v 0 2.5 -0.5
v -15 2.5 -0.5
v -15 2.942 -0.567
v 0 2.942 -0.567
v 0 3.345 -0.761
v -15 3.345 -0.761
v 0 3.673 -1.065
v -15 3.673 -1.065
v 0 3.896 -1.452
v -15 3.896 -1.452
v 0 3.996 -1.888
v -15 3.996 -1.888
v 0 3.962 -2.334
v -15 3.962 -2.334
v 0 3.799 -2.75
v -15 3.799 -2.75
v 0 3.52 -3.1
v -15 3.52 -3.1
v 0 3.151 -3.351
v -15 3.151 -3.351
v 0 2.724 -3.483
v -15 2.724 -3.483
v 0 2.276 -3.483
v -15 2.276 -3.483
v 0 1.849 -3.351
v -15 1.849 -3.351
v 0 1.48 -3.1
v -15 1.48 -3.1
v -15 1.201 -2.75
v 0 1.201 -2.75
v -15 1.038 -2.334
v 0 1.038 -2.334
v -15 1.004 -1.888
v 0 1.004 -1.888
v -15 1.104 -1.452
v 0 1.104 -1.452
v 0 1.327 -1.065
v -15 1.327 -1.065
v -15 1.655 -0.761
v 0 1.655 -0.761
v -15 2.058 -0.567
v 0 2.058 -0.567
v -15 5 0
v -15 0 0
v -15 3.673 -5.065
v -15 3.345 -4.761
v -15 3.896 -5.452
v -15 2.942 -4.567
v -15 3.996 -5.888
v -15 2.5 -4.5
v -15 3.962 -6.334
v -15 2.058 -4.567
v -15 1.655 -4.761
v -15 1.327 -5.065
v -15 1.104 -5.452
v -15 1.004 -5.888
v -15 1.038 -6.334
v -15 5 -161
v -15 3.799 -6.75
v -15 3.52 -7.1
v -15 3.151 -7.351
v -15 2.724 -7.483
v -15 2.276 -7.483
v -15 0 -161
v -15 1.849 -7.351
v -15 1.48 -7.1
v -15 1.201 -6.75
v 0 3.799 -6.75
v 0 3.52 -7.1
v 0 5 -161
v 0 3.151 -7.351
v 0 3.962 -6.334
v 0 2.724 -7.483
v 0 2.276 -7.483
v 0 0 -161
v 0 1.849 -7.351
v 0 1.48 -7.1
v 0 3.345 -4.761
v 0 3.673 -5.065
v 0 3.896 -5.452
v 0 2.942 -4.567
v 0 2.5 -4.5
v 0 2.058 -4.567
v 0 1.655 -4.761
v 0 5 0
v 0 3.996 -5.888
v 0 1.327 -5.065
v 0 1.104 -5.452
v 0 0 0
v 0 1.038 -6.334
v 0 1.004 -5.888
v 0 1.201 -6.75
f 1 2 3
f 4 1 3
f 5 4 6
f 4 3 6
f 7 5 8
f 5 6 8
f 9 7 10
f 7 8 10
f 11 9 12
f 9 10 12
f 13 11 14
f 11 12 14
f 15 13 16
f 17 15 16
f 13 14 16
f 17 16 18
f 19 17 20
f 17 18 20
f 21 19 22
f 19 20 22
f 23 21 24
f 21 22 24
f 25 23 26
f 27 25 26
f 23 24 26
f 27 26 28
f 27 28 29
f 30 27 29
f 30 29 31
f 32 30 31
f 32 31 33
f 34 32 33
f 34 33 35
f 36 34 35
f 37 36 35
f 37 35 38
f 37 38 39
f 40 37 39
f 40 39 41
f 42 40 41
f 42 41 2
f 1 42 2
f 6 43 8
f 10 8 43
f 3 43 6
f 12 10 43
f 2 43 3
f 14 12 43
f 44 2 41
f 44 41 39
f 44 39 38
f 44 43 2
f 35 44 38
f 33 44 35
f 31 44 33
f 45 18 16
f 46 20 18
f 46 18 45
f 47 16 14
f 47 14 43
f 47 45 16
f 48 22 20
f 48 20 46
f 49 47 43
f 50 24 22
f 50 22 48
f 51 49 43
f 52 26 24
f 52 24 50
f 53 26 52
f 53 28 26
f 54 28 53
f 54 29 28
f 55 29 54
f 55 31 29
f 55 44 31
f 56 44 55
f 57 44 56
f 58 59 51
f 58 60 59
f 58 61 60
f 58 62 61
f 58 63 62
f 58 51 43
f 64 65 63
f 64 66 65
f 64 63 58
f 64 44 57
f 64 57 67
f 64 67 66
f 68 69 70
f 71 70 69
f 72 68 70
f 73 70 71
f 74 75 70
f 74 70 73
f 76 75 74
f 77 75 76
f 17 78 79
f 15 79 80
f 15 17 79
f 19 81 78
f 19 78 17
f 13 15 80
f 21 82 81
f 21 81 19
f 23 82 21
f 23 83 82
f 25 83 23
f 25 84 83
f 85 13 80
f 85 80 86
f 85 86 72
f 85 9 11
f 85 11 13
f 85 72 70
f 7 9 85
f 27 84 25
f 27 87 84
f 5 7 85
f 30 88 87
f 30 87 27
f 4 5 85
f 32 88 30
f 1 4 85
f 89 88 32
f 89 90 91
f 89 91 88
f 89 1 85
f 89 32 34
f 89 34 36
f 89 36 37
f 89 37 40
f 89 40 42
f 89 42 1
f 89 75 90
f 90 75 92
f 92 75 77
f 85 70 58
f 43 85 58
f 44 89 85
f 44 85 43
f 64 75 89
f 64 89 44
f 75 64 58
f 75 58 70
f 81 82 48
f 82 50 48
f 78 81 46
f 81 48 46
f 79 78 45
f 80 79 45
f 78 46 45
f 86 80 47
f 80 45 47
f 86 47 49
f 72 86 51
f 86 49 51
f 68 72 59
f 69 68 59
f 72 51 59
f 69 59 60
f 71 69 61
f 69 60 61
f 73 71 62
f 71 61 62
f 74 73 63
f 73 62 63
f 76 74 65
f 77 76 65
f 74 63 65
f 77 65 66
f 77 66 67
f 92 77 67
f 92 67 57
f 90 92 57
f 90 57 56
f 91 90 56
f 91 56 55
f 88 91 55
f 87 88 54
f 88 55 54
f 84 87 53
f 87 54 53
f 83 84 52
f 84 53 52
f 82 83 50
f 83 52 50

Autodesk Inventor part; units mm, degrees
ref_plane "YZ Plane" through (0, 0, 0) normal (1, 0, 0) x (0, 1, 0)
ref_plane "XZ Plane" through (0, 0, 0) normal (0, 1, 0) x (-1, 0, 0)
ref_plane "XY Plane" through (0, 0, 0) normal (0, 0, 1) x (1, 0, 0)
sketch "草图1" plane through (0, 0, 0) normal (0, 1, 0) x (-1, 0, 0)
  line L0 (0, 0) -> (15, 0)
  line L1 (15, 0) -> (15, -161)
  line L2 (15, -161) -> (0, -161)
  line L3 (0, -161) -> (0, 0)
  dimension "d0" = 161
  dimension "d1" = 15
extrude "拉伸1" add sketch "草图1" along normal blind 5
sketch "草图2" plane through (-15, 0, -161) normal (-1, 0, 0) x (0, 0, 1)
  line L0 (161, 0) -> (161, 5) projected
  line L1 (161, 2.5) -> (159, 2.5)
  circle A0 centre (159, 2.5) radius 1.5
  line L2 (159, 2.5) -> (155, 2.5)
  circle A1 centre (155, 2.5) radius 1.5
  dimension "d4" = 2
  dimension "d5" = 3
  dimension "d6" = 4
  dimension "d7" = 3
extrude "拉伸2" cut sketch "草图2" against normal through all
equation "\"折弯半径\" = 厚度"
equation "\"折弯释压宽度\" = 厚度"
equation "\"折弯释压深度\" = 0.5 * 厚度"
equation "\"拐角释压尺寸\" = 4 * 厚度"
equation "\"最小余量\" = 2 * 厚度"
equation "\"过渡半径\" = 折弯半径"
equation "\"Jacobi半径尺寸\" = 折弯半径"
equation "\"间隙大小\" = 厚度"
equation "\"厚度\" = 0.5"
properties part number "123"
